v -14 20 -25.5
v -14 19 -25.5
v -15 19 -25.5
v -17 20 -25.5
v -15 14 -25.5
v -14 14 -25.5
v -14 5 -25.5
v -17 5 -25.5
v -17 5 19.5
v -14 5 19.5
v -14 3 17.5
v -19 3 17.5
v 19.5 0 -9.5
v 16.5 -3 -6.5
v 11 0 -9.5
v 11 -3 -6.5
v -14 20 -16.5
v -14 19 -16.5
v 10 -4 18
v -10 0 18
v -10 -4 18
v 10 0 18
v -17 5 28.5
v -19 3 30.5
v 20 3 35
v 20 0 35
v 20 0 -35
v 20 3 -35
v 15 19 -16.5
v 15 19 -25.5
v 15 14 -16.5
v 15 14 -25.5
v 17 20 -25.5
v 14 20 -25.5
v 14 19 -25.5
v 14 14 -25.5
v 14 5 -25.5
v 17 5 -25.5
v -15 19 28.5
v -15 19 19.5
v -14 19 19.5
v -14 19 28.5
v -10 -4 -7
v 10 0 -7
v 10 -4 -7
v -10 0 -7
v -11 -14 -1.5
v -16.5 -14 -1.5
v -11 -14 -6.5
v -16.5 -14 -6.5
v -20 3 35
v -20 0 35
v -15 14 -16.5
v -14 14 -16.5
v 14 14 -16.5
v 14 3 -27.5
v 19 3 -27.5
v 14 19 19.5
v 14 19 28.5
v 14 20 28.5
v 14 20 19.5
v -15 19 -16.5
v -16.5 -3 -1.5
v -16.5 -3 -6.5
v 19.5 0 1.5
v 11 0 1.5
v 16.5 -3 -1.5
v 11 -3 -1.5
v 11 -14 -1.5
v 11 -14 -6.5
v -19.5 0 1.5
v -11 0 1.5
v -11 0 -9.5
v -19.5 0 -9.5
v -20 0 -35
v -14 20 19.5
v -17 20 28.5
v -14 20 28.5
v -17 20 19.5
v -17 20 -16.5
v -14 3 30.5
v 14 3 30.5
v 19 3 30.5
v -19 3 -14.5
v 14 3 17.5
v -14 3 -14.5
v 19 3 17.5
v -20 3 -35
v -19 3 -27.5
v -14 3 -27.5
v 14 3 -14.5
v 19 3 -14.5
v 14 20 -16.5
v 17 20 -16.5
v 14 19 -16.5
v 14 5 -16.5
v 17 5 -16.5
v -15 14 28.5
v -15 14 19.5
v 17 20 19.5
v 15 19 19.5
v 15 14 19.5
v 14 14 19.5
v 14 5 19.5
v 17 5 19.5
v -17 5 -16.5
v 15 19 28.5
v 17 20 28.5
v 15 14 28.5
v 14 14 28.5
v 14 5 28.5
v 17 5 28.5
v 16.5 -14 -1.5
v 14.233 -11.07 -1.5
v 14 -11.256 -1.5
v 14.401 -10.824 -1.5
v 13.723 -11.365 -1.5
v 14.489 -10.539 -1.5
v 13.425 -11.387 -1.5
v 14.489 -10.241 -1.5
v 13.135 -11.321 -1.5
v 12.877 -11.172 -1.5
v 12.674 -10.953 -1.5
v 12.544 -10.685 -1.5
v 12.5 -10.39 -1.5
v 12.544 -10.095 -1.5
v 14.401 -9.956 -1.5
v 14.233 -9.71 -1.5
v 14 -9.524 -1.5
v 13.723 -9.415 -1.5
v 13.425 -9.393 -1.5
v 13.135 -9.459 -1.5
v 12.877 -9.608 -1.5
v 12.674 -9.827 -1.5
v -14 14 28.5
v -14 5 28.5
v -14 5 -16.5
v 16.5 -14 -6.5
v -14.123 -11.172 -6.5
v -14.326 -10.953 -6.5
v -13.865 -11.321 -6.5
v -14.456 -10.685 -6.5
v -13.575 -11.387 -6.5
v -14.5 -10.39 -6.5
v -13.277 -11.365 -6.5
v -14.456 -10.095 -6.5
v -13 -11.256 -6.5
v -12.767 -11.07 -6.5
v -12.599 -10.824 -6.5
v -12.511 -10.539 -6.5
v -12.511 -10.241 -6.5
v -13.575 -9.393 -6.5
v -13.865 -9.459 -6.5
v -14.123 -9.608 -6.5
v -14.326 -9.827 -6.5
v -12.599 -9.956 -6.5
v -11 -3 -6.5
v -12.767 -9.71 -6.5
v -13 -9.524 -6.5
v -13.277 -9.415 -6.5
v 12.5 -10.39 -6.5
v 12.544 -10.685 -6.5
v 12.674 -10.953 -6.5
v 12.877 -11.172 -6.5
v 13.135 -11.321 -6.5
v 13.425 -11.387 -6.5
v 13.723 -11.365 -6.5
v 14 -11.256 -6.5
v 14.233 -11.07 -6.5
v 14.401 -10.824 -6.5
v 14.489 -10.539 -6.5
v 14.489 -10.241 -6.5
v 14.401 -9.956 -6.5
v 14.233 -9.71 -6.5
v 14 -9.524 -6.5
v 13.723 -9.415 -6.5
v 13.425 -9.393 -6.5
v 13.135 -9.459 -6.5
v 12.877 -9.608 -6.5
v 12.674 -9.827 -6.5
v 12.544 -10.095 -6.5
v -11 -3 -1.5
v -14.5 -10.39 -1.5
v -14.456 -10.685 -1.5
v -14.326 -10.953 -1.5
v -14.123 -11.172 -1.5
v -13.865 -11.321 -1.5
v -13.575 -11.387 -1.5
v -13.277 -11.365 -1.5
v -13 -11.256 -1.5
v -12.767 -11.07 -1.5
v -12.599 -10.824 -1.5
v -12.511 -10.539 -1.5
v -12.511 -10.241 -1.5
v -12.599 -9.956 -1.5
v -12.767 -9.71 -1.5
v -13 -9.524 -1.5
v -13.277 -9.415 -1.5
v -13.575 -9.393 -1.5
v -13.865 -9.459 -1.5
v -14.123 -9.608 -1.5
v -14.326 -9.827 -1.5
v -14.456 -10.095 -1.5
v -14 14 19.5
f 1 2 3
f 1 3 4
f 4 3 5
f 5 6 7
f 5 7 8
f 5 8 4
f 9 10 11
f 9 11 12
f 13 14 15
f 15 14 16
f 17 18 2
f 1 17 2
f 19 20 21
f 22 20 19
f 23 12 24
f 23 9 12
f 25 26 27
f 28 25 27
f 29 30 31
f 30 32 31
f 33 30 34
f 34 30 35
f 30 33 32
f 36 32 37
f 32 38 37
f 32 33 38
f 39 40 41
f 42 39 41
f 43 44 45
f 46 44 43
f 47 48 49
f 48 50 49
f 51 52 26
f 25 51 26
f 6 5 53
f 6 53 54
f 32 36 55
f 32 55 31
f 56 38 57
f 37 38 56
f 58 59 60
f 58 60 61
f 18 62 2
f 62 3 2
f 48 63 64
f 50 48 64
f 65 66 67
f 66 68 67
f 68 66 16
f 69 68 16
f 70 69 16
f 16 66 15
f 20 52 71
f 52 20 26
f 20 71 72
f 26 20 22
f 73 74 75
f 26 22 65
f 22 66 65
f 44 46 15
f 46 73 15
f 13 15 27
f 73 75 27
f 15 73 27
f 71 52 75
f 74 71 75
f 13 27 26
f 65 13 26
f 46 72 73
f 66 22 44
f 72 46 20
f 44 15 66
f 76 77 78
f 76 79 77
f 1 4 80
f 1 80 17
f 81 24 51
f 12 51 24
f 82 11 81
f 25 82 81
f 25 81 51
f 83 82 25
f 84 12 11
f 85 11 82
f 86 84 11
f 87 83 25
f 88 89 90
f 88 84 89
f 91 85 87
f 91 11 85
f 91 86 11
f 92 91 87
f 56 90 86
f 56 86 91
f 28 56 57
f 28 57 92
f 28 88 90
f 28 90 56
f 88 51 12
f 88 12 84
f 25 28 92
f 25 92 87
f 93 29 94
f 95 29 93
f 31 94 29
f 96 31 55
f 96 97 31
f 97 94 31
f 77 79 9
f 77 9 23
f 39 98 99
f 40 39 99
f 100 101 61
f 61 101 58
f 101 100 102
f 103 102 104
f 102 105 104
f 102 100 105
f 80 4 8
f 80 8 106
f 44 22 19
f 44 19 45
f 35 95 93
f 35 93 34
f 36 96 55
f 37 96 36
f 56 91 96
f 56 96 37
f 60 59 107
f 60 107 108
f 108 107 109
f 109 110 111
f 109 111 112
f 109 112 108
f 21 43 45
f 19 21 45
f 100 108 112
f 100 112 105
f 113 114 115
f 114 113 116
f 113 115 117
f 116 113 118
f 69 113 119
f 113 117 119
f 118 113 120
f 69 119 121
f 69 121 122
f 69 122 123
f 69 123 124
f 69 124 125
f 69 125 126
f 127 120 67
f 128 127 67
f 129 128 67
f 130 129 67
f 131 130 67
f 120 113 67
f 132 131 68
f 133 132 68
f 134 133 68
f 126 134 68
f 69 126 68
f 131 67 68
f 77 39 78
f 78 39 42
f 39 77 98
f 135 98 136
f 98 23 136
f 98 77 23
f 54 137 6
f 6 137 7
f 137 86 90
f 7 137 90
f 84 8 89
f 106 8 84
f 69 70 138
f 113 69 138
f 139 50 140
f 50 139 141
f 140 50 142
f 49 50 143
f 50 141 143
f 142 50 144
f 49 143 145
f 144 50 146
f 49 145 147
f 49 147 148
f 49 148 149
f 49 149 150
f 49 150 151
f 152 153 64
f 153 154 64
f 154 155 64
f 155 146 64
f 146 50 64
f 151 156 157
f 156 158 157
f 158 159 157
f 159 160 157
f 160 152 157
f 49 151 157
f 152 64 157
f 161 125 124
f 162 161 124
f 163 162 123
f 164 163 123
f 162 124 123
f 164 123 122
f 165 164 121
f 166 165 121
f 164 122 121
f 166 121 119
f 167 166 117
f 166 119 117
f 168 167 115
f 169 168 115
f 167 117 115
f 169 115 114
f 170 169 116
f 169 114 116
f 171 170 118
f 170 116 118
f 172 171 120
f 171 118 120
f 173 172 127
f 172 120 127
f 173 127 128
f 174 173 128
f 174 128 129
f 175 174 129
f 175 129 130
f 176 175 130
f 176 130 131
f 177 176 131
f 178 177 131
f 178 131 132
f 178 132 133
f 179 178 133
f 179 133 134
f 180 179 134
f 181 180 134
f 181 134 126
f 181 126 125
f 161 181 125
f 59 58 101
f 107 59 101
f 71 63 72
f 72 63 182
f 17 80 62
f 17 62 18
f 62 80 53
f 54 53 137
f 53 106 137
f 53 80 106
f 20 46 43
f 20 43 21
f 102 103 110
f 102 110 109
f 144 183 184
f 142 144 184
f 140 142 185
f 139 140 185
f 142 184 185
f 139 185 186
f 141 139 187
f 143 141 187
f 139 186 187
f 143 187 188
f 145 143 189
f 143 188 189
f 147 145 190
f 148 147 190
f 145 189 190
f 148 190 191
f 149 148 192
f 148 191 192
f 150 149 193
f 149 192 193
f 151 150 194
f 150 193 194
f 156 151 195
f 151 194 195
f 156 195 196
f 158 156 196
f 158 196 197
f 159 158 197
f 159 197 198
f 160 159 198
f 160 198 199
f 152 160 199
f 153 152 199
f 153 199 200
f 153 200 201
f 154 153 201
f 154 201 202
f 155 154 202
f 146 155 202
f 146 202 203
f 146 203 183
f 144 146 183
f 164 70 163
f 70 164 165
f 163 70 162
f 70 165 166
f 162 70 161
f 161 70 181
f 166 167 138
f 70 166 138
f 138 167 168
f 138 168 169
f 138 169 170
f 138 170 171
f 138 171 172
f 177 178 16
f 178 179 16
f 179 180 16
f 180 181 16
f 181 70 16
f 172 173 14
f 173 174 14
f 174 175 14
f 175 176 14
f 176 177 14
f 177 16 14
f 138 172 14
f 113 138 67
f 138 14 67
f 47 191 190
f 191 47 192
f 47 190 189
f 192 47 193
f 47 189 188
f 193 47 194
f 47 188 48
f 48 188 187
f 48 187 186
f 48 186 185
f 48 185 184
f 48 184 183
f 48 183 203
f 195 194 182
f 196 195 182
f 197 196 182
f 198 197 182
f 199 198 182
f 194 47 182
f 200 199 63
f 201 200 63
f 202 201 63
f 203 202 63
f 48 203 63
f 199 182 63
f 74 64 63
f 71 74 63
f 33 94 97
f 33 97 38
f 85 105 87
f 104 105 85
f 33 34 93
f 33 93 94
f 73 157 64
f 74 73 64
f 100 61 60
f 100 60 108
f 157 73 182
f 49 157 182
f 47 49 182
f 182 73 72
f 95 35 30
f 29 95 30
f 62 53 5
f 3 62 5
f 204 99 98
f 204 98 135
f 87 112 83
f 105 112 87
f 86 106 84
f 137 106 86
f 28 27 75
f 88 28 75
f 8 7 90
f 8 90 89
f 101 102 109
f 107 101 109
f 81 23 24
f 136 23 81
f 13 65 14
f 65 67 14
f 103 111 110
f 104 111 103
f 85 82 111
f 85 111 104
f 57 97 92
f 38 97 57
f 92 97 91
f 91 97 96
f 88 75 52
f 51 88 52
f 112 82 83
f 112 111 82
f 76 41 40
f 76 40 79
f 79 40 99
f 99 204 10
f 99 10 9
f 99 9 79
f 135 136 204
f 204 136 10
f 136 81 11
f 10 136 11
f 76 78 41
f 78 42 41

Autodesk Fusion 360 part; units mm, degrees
sketch "Sketch1" plane through (0, 0, 0) normal (0, 1, 0) x (1, 0, 0)
  line L0 (-20, -35) -> (20, -35)
  line L1 (20, -35) -> (20, 35)
  line L2 (20, 35) -> (-20, 35)
  line L3 (-20, 35) -> (-20, -35)
  line L4 (-14.65, -4.5) -> (-12.65, -4.5)
  line L5 (-12.65, -4.5) -> (-12.65, 4.5)
  line L6 (-12.65, 4.5) -> (-14.65, 4.5)
  line L7 (-14.65, 4.5) -> (-14.65, -4.5)
  line L8 (12.65, -4.5) -> (14.65, -4.5)
  line L9 (14.65, -4.5) -> (14.65, 4.5)
  line L10 (14.65, 4.5) -> (12.65, 4.5)
  line L11 (12.65, 4.5) -> (12.65, -4.5)
  line L12 (-12.65, -4.5) -> (-11.65, -4.5)
  line L13 (-11.65, -4.5) -> (-11.65, 4.5)
  line L14 (-11.65, 4.5) -> (-12.65, 4.5)
  line L15 (-12.65, 4.5) -> (-12.65, -4.5)
  line L16 (12.65, -4.5) -> (11.65, -4.5)
  line L17 (11.65, -4.5) -> (11.65, 4.5)
  line L18 (11.65, 4.5) -> (12.65, 4.5)
  line L19 (12.65, 4.5) -> (12.65, -4.5)
  circle A0 centre (0, 0) radius 5
  line L20 (14, 16.5) -> (14, 25.5)
  line L21 (15, 16.5) -> (14, 16.5)
  line L22 (17, 16.5) -> (17, 25.5)
  line L23 (15, 25.5) -> (15, 16.5)
  line L24 (15, 16.5) -> (17, 16.5)
  line L25 (15, 25.5) -> (15, 16.5)
  line L26 (15, -19.5) -> (15, -28.5)
  line L27 (15, -19.5) -> (15, -28.5)
  line L28 (15, -28.5) -> (17, -28.5)
  line L29 (14, -28.5) -> (14, -19.5)
  line L30 (15, -28.5) -> (14, -28.5)
  line L31 (17, -28.5) -> (17, -19.5)
  line L32 (-15, -28.5) -> (-15, -19.5)
  line L33 (-17, -19.5) -> (-17, -28.5)
  line L34 (-15, -28.5) -> (-14, -28.5)
  line L35 (-14, -28.5) -> (-14, -19.5)
  line L36 (-15, -19.5) -> (-17, -19.5)
  line L37 (-15, -19.5) -> (-15, -28.5)
  line L38 (-14, -19.5) -> (-15, -19.5)
  line L39 (-17, -28.5) -> (-15, -28.5)
  line L40 (-15, 16.5) -> (-15, 25.5)
  line L41 (-17, 25.5) -> (-17, 16.5)
  line L42 (-15, 16.5) -> (-14, 16.5)
  line L43 (-14, 16.5) -> (-14, 25.5)
  line L44 (-15, 25.5) -> (-17, 25.5)
  line L45 (-15, 25.5) -> (-15, 16.5)
  line L46 (-14, 25.5) -> (-15, 25.5)
  line L47 (-17, 16.5) -> (-15, 16.5)
  line L48 (17, 25.5) -> (14, 25.5)
  line L49 (17, -19.5) -> (14, -19.5)
  line L50 (12.65, 1.5) -> (14.65, 1.5)
  line L51 (-14.65, 1.5) -> (-12.65, 1.5)
  line L52 (-10, -18) -> (10, -18)
  line L53 (10, -18) -> (10, 7)
  line L54 (10, 7) -> (-10, 7)
  line L55 (-10, 7) -> (-10, -18)
  line L56 (16.5, 1.5) -> (10.5, 1.5)
  line L57 (10.5, 1.5) -> (10.5, 6.5)
  line L58 (10.5, 6.5) -> (16.5, 6.5)
  line L59 (16.5, 6.5) -> (16.5, 1.5)
  line L60 (-10.5, 1.5) -> (-16.5, 1.5)
  line L61 (-16.5, 1.5) -> (-16.5, 6.5)
  line L62 (-16.5, 6.5) -> (-10.5, 6.5)
  line L63 (-10.5, 6.5) -> (-10.5, 1.5)
  dimension "d1" = 40
  dimension "d2" = 70
  dimension "d3" = 20
  dimension "d4" = 35
  dimension "d5" = 9
  dimension "d6" = 2
  dimension "d7" = 4.5
  dimension "d8" = 12.65
  dimension "d9" = 2
  dimension "d10" = 9
  dimension "d11" = 12.65
  dimension "d12" = 4.5
  dimension "d13" = 1
  dimension "d14" = 9
  dimension "d15" = 1
  dimension "d16" = 9
  dimension "d17" = 10
  dimension "d18" = 2
  dimension "d19" = 9
  dimension "d20" = 1
  dimension "d21" = 9
  dimension "d22" = 2
  dimension "d23" = 9
  dimension "d24" = 1
  dimension "d25" = 9
  dimension "d26" = 9
  dimension "d27" = 2
  dimension "d28" = 1
  dimension "d29" = 9
  dimension "d30" = 9
  dimension "d31" = 2
  dimension "d32" = 1
  dimension "d33" = 9
  dimension "d40" = 3
  dimension "d41" = 3
  dimension "d58" = 20
  dimension "d59" = 25
  dimension "d60" = 10
  dimension "d61" = 18
  dimension "d64" = 6
  dimension "d65" = 5
  dimension "d66" = 2.15
  dimension "d67" = 2.15
  dimension "d79" = 3
  dimension "d80" = 3
  dimension "d81" = 3
  dimension "d82" = 3
extrude "Extrude1" add sketch "Sketch1" along normal blind 3 contours L0 L1 L2 L3 | L4 L5 L7 L15 L51 L60 | L5 L12 L13 L15 L60 | L6 L7 L13 L14 L60 L61 L62 L63 | L5 L6 L7 L15 L51 L60 | L5 L13 L14 L15 L60 | L8 L9 L11 L19 L50 L56 | L11 L16 L17 L19 L56 | L11 L17 L18 L19 L56 | L9 L10 L11 L19 L50 L56 | L9 L10 L17 L18 L56 L57 L58 L59 | A0 | L20 L21 L23 L25 L48 | L22 L23 L24 L25 L48 | L26 L27 L28 L31 L49 | L26 L27 L29 L30 L49 | L32 L33 L36 L37 L39 | L32 L34 L35 L37 L38 | L40 L41 L44 L45 L47 | L40 L42 L43 L45 L46 | L52 L53 L54 L55
extrude "Extrude2" add sketch "Sketch1" against normal blind 14 contours L6 L7 L13 L14 L60 L61 L62 L63 | L5 L6 L7 L15 L51 L60 | L5 L13 L14 L15 L60 | L11 L17 L18 L19 L56 | L9 L10 L11 L19 L50 L56 | L9 L10 L17 L18 L56 L57 L58 L59
extrude "Extrude4" add sketch "Sketch1" along normal blind 20 contours L20 L21 L23 L25 L48 | L22 L23 L24 L25 L48 | L26 L27 L28 L31 L49 | L26 L27 L29 L30 L49 | L32 L33 L36 L37 L39 | L32 L34 L35 L37 L38 | L40 L41 L44 L45 L47 | L40 L42 L43 L45 L46
extrude "Extrude5" cut sketch "Sketch1" along normal blind 19 contours L20 L21 L23 L25 L48 | L26 L27 L29 L30 L49 | L32 L34 L35 L37 L38 | L40 L42 L43 L45 L46
extrude "Extrude6" add sketch "Sketch1" along normal blind 14 contours L20 L21 L23 L25 L48 | L26 L27 L29 L30 L49 | L32 L34 L35 L37 L38 | L40 L42 L43 L45 L46
chamfer "Chamfer3" distance 2 angle 45 12 edges at (-15.5, 3, -16.5) (-17, 3, 24) (-17, 3, -21) (-15.5, 3, -25.5) (15.5, 3, -25.5) (17, 3, -21) (15.5, 3, -16.5) (15.5, 3, 19.5) (17, 3, 24) (15.5, 3, 28.5) (-15.5, 3, 28.5) (-15.5, 3, 19.5)
extrude "Extrude7" add sketch "Sketch1" against normal blind 4 contours A0 | L52 L53 L54 L55
sketch "Sketch2" plane through (0, 0, -1.5) normal (0, 0, 1) x (-1, 0, 0)
  line L0 (10.5, 0) -> (16.5, 0)
  line L1 (16.5, 0) -> (16.5, 14)
  line L2 (16.5, 14) -> (10.5, 14)
  line L3 (10.5, 14) -> (10.5, 0)
  circle A0 centre (13.5, 10.39) radius 1
  circle A1 centre (-13.5, 10.39) radius 1
  line L4 (-10.5, 0) -> (-10.5, 14)
  line L5 (20, 0) -> (-20, 0)
  dimension "d68" = 2
  dimension "d70" = 10.39
  dimension "d71" = 3
  dimension "d72" = 2
  dimension "d73" = 3
  dimension "d74" = 10.39
extrude "Extrude8" cut sketch "Sketch2" against normal blind 9 contours A0 | A1
chamfer "Chamfer4" distance 3 angle 45 6 edges at (16.5, 0, -4) (13.5, 0, -1.5) (13.5, 0, -6.5) (-13.5, 0, -6.5) (-16.5, 0, -4) (-13.5, 0, -1.5)
move_face "OffsetFaces1" offset -0.5 2 faces at (10.5, -6.6667, -4.8333) (-10.5, -6.6667, -3.1667)
